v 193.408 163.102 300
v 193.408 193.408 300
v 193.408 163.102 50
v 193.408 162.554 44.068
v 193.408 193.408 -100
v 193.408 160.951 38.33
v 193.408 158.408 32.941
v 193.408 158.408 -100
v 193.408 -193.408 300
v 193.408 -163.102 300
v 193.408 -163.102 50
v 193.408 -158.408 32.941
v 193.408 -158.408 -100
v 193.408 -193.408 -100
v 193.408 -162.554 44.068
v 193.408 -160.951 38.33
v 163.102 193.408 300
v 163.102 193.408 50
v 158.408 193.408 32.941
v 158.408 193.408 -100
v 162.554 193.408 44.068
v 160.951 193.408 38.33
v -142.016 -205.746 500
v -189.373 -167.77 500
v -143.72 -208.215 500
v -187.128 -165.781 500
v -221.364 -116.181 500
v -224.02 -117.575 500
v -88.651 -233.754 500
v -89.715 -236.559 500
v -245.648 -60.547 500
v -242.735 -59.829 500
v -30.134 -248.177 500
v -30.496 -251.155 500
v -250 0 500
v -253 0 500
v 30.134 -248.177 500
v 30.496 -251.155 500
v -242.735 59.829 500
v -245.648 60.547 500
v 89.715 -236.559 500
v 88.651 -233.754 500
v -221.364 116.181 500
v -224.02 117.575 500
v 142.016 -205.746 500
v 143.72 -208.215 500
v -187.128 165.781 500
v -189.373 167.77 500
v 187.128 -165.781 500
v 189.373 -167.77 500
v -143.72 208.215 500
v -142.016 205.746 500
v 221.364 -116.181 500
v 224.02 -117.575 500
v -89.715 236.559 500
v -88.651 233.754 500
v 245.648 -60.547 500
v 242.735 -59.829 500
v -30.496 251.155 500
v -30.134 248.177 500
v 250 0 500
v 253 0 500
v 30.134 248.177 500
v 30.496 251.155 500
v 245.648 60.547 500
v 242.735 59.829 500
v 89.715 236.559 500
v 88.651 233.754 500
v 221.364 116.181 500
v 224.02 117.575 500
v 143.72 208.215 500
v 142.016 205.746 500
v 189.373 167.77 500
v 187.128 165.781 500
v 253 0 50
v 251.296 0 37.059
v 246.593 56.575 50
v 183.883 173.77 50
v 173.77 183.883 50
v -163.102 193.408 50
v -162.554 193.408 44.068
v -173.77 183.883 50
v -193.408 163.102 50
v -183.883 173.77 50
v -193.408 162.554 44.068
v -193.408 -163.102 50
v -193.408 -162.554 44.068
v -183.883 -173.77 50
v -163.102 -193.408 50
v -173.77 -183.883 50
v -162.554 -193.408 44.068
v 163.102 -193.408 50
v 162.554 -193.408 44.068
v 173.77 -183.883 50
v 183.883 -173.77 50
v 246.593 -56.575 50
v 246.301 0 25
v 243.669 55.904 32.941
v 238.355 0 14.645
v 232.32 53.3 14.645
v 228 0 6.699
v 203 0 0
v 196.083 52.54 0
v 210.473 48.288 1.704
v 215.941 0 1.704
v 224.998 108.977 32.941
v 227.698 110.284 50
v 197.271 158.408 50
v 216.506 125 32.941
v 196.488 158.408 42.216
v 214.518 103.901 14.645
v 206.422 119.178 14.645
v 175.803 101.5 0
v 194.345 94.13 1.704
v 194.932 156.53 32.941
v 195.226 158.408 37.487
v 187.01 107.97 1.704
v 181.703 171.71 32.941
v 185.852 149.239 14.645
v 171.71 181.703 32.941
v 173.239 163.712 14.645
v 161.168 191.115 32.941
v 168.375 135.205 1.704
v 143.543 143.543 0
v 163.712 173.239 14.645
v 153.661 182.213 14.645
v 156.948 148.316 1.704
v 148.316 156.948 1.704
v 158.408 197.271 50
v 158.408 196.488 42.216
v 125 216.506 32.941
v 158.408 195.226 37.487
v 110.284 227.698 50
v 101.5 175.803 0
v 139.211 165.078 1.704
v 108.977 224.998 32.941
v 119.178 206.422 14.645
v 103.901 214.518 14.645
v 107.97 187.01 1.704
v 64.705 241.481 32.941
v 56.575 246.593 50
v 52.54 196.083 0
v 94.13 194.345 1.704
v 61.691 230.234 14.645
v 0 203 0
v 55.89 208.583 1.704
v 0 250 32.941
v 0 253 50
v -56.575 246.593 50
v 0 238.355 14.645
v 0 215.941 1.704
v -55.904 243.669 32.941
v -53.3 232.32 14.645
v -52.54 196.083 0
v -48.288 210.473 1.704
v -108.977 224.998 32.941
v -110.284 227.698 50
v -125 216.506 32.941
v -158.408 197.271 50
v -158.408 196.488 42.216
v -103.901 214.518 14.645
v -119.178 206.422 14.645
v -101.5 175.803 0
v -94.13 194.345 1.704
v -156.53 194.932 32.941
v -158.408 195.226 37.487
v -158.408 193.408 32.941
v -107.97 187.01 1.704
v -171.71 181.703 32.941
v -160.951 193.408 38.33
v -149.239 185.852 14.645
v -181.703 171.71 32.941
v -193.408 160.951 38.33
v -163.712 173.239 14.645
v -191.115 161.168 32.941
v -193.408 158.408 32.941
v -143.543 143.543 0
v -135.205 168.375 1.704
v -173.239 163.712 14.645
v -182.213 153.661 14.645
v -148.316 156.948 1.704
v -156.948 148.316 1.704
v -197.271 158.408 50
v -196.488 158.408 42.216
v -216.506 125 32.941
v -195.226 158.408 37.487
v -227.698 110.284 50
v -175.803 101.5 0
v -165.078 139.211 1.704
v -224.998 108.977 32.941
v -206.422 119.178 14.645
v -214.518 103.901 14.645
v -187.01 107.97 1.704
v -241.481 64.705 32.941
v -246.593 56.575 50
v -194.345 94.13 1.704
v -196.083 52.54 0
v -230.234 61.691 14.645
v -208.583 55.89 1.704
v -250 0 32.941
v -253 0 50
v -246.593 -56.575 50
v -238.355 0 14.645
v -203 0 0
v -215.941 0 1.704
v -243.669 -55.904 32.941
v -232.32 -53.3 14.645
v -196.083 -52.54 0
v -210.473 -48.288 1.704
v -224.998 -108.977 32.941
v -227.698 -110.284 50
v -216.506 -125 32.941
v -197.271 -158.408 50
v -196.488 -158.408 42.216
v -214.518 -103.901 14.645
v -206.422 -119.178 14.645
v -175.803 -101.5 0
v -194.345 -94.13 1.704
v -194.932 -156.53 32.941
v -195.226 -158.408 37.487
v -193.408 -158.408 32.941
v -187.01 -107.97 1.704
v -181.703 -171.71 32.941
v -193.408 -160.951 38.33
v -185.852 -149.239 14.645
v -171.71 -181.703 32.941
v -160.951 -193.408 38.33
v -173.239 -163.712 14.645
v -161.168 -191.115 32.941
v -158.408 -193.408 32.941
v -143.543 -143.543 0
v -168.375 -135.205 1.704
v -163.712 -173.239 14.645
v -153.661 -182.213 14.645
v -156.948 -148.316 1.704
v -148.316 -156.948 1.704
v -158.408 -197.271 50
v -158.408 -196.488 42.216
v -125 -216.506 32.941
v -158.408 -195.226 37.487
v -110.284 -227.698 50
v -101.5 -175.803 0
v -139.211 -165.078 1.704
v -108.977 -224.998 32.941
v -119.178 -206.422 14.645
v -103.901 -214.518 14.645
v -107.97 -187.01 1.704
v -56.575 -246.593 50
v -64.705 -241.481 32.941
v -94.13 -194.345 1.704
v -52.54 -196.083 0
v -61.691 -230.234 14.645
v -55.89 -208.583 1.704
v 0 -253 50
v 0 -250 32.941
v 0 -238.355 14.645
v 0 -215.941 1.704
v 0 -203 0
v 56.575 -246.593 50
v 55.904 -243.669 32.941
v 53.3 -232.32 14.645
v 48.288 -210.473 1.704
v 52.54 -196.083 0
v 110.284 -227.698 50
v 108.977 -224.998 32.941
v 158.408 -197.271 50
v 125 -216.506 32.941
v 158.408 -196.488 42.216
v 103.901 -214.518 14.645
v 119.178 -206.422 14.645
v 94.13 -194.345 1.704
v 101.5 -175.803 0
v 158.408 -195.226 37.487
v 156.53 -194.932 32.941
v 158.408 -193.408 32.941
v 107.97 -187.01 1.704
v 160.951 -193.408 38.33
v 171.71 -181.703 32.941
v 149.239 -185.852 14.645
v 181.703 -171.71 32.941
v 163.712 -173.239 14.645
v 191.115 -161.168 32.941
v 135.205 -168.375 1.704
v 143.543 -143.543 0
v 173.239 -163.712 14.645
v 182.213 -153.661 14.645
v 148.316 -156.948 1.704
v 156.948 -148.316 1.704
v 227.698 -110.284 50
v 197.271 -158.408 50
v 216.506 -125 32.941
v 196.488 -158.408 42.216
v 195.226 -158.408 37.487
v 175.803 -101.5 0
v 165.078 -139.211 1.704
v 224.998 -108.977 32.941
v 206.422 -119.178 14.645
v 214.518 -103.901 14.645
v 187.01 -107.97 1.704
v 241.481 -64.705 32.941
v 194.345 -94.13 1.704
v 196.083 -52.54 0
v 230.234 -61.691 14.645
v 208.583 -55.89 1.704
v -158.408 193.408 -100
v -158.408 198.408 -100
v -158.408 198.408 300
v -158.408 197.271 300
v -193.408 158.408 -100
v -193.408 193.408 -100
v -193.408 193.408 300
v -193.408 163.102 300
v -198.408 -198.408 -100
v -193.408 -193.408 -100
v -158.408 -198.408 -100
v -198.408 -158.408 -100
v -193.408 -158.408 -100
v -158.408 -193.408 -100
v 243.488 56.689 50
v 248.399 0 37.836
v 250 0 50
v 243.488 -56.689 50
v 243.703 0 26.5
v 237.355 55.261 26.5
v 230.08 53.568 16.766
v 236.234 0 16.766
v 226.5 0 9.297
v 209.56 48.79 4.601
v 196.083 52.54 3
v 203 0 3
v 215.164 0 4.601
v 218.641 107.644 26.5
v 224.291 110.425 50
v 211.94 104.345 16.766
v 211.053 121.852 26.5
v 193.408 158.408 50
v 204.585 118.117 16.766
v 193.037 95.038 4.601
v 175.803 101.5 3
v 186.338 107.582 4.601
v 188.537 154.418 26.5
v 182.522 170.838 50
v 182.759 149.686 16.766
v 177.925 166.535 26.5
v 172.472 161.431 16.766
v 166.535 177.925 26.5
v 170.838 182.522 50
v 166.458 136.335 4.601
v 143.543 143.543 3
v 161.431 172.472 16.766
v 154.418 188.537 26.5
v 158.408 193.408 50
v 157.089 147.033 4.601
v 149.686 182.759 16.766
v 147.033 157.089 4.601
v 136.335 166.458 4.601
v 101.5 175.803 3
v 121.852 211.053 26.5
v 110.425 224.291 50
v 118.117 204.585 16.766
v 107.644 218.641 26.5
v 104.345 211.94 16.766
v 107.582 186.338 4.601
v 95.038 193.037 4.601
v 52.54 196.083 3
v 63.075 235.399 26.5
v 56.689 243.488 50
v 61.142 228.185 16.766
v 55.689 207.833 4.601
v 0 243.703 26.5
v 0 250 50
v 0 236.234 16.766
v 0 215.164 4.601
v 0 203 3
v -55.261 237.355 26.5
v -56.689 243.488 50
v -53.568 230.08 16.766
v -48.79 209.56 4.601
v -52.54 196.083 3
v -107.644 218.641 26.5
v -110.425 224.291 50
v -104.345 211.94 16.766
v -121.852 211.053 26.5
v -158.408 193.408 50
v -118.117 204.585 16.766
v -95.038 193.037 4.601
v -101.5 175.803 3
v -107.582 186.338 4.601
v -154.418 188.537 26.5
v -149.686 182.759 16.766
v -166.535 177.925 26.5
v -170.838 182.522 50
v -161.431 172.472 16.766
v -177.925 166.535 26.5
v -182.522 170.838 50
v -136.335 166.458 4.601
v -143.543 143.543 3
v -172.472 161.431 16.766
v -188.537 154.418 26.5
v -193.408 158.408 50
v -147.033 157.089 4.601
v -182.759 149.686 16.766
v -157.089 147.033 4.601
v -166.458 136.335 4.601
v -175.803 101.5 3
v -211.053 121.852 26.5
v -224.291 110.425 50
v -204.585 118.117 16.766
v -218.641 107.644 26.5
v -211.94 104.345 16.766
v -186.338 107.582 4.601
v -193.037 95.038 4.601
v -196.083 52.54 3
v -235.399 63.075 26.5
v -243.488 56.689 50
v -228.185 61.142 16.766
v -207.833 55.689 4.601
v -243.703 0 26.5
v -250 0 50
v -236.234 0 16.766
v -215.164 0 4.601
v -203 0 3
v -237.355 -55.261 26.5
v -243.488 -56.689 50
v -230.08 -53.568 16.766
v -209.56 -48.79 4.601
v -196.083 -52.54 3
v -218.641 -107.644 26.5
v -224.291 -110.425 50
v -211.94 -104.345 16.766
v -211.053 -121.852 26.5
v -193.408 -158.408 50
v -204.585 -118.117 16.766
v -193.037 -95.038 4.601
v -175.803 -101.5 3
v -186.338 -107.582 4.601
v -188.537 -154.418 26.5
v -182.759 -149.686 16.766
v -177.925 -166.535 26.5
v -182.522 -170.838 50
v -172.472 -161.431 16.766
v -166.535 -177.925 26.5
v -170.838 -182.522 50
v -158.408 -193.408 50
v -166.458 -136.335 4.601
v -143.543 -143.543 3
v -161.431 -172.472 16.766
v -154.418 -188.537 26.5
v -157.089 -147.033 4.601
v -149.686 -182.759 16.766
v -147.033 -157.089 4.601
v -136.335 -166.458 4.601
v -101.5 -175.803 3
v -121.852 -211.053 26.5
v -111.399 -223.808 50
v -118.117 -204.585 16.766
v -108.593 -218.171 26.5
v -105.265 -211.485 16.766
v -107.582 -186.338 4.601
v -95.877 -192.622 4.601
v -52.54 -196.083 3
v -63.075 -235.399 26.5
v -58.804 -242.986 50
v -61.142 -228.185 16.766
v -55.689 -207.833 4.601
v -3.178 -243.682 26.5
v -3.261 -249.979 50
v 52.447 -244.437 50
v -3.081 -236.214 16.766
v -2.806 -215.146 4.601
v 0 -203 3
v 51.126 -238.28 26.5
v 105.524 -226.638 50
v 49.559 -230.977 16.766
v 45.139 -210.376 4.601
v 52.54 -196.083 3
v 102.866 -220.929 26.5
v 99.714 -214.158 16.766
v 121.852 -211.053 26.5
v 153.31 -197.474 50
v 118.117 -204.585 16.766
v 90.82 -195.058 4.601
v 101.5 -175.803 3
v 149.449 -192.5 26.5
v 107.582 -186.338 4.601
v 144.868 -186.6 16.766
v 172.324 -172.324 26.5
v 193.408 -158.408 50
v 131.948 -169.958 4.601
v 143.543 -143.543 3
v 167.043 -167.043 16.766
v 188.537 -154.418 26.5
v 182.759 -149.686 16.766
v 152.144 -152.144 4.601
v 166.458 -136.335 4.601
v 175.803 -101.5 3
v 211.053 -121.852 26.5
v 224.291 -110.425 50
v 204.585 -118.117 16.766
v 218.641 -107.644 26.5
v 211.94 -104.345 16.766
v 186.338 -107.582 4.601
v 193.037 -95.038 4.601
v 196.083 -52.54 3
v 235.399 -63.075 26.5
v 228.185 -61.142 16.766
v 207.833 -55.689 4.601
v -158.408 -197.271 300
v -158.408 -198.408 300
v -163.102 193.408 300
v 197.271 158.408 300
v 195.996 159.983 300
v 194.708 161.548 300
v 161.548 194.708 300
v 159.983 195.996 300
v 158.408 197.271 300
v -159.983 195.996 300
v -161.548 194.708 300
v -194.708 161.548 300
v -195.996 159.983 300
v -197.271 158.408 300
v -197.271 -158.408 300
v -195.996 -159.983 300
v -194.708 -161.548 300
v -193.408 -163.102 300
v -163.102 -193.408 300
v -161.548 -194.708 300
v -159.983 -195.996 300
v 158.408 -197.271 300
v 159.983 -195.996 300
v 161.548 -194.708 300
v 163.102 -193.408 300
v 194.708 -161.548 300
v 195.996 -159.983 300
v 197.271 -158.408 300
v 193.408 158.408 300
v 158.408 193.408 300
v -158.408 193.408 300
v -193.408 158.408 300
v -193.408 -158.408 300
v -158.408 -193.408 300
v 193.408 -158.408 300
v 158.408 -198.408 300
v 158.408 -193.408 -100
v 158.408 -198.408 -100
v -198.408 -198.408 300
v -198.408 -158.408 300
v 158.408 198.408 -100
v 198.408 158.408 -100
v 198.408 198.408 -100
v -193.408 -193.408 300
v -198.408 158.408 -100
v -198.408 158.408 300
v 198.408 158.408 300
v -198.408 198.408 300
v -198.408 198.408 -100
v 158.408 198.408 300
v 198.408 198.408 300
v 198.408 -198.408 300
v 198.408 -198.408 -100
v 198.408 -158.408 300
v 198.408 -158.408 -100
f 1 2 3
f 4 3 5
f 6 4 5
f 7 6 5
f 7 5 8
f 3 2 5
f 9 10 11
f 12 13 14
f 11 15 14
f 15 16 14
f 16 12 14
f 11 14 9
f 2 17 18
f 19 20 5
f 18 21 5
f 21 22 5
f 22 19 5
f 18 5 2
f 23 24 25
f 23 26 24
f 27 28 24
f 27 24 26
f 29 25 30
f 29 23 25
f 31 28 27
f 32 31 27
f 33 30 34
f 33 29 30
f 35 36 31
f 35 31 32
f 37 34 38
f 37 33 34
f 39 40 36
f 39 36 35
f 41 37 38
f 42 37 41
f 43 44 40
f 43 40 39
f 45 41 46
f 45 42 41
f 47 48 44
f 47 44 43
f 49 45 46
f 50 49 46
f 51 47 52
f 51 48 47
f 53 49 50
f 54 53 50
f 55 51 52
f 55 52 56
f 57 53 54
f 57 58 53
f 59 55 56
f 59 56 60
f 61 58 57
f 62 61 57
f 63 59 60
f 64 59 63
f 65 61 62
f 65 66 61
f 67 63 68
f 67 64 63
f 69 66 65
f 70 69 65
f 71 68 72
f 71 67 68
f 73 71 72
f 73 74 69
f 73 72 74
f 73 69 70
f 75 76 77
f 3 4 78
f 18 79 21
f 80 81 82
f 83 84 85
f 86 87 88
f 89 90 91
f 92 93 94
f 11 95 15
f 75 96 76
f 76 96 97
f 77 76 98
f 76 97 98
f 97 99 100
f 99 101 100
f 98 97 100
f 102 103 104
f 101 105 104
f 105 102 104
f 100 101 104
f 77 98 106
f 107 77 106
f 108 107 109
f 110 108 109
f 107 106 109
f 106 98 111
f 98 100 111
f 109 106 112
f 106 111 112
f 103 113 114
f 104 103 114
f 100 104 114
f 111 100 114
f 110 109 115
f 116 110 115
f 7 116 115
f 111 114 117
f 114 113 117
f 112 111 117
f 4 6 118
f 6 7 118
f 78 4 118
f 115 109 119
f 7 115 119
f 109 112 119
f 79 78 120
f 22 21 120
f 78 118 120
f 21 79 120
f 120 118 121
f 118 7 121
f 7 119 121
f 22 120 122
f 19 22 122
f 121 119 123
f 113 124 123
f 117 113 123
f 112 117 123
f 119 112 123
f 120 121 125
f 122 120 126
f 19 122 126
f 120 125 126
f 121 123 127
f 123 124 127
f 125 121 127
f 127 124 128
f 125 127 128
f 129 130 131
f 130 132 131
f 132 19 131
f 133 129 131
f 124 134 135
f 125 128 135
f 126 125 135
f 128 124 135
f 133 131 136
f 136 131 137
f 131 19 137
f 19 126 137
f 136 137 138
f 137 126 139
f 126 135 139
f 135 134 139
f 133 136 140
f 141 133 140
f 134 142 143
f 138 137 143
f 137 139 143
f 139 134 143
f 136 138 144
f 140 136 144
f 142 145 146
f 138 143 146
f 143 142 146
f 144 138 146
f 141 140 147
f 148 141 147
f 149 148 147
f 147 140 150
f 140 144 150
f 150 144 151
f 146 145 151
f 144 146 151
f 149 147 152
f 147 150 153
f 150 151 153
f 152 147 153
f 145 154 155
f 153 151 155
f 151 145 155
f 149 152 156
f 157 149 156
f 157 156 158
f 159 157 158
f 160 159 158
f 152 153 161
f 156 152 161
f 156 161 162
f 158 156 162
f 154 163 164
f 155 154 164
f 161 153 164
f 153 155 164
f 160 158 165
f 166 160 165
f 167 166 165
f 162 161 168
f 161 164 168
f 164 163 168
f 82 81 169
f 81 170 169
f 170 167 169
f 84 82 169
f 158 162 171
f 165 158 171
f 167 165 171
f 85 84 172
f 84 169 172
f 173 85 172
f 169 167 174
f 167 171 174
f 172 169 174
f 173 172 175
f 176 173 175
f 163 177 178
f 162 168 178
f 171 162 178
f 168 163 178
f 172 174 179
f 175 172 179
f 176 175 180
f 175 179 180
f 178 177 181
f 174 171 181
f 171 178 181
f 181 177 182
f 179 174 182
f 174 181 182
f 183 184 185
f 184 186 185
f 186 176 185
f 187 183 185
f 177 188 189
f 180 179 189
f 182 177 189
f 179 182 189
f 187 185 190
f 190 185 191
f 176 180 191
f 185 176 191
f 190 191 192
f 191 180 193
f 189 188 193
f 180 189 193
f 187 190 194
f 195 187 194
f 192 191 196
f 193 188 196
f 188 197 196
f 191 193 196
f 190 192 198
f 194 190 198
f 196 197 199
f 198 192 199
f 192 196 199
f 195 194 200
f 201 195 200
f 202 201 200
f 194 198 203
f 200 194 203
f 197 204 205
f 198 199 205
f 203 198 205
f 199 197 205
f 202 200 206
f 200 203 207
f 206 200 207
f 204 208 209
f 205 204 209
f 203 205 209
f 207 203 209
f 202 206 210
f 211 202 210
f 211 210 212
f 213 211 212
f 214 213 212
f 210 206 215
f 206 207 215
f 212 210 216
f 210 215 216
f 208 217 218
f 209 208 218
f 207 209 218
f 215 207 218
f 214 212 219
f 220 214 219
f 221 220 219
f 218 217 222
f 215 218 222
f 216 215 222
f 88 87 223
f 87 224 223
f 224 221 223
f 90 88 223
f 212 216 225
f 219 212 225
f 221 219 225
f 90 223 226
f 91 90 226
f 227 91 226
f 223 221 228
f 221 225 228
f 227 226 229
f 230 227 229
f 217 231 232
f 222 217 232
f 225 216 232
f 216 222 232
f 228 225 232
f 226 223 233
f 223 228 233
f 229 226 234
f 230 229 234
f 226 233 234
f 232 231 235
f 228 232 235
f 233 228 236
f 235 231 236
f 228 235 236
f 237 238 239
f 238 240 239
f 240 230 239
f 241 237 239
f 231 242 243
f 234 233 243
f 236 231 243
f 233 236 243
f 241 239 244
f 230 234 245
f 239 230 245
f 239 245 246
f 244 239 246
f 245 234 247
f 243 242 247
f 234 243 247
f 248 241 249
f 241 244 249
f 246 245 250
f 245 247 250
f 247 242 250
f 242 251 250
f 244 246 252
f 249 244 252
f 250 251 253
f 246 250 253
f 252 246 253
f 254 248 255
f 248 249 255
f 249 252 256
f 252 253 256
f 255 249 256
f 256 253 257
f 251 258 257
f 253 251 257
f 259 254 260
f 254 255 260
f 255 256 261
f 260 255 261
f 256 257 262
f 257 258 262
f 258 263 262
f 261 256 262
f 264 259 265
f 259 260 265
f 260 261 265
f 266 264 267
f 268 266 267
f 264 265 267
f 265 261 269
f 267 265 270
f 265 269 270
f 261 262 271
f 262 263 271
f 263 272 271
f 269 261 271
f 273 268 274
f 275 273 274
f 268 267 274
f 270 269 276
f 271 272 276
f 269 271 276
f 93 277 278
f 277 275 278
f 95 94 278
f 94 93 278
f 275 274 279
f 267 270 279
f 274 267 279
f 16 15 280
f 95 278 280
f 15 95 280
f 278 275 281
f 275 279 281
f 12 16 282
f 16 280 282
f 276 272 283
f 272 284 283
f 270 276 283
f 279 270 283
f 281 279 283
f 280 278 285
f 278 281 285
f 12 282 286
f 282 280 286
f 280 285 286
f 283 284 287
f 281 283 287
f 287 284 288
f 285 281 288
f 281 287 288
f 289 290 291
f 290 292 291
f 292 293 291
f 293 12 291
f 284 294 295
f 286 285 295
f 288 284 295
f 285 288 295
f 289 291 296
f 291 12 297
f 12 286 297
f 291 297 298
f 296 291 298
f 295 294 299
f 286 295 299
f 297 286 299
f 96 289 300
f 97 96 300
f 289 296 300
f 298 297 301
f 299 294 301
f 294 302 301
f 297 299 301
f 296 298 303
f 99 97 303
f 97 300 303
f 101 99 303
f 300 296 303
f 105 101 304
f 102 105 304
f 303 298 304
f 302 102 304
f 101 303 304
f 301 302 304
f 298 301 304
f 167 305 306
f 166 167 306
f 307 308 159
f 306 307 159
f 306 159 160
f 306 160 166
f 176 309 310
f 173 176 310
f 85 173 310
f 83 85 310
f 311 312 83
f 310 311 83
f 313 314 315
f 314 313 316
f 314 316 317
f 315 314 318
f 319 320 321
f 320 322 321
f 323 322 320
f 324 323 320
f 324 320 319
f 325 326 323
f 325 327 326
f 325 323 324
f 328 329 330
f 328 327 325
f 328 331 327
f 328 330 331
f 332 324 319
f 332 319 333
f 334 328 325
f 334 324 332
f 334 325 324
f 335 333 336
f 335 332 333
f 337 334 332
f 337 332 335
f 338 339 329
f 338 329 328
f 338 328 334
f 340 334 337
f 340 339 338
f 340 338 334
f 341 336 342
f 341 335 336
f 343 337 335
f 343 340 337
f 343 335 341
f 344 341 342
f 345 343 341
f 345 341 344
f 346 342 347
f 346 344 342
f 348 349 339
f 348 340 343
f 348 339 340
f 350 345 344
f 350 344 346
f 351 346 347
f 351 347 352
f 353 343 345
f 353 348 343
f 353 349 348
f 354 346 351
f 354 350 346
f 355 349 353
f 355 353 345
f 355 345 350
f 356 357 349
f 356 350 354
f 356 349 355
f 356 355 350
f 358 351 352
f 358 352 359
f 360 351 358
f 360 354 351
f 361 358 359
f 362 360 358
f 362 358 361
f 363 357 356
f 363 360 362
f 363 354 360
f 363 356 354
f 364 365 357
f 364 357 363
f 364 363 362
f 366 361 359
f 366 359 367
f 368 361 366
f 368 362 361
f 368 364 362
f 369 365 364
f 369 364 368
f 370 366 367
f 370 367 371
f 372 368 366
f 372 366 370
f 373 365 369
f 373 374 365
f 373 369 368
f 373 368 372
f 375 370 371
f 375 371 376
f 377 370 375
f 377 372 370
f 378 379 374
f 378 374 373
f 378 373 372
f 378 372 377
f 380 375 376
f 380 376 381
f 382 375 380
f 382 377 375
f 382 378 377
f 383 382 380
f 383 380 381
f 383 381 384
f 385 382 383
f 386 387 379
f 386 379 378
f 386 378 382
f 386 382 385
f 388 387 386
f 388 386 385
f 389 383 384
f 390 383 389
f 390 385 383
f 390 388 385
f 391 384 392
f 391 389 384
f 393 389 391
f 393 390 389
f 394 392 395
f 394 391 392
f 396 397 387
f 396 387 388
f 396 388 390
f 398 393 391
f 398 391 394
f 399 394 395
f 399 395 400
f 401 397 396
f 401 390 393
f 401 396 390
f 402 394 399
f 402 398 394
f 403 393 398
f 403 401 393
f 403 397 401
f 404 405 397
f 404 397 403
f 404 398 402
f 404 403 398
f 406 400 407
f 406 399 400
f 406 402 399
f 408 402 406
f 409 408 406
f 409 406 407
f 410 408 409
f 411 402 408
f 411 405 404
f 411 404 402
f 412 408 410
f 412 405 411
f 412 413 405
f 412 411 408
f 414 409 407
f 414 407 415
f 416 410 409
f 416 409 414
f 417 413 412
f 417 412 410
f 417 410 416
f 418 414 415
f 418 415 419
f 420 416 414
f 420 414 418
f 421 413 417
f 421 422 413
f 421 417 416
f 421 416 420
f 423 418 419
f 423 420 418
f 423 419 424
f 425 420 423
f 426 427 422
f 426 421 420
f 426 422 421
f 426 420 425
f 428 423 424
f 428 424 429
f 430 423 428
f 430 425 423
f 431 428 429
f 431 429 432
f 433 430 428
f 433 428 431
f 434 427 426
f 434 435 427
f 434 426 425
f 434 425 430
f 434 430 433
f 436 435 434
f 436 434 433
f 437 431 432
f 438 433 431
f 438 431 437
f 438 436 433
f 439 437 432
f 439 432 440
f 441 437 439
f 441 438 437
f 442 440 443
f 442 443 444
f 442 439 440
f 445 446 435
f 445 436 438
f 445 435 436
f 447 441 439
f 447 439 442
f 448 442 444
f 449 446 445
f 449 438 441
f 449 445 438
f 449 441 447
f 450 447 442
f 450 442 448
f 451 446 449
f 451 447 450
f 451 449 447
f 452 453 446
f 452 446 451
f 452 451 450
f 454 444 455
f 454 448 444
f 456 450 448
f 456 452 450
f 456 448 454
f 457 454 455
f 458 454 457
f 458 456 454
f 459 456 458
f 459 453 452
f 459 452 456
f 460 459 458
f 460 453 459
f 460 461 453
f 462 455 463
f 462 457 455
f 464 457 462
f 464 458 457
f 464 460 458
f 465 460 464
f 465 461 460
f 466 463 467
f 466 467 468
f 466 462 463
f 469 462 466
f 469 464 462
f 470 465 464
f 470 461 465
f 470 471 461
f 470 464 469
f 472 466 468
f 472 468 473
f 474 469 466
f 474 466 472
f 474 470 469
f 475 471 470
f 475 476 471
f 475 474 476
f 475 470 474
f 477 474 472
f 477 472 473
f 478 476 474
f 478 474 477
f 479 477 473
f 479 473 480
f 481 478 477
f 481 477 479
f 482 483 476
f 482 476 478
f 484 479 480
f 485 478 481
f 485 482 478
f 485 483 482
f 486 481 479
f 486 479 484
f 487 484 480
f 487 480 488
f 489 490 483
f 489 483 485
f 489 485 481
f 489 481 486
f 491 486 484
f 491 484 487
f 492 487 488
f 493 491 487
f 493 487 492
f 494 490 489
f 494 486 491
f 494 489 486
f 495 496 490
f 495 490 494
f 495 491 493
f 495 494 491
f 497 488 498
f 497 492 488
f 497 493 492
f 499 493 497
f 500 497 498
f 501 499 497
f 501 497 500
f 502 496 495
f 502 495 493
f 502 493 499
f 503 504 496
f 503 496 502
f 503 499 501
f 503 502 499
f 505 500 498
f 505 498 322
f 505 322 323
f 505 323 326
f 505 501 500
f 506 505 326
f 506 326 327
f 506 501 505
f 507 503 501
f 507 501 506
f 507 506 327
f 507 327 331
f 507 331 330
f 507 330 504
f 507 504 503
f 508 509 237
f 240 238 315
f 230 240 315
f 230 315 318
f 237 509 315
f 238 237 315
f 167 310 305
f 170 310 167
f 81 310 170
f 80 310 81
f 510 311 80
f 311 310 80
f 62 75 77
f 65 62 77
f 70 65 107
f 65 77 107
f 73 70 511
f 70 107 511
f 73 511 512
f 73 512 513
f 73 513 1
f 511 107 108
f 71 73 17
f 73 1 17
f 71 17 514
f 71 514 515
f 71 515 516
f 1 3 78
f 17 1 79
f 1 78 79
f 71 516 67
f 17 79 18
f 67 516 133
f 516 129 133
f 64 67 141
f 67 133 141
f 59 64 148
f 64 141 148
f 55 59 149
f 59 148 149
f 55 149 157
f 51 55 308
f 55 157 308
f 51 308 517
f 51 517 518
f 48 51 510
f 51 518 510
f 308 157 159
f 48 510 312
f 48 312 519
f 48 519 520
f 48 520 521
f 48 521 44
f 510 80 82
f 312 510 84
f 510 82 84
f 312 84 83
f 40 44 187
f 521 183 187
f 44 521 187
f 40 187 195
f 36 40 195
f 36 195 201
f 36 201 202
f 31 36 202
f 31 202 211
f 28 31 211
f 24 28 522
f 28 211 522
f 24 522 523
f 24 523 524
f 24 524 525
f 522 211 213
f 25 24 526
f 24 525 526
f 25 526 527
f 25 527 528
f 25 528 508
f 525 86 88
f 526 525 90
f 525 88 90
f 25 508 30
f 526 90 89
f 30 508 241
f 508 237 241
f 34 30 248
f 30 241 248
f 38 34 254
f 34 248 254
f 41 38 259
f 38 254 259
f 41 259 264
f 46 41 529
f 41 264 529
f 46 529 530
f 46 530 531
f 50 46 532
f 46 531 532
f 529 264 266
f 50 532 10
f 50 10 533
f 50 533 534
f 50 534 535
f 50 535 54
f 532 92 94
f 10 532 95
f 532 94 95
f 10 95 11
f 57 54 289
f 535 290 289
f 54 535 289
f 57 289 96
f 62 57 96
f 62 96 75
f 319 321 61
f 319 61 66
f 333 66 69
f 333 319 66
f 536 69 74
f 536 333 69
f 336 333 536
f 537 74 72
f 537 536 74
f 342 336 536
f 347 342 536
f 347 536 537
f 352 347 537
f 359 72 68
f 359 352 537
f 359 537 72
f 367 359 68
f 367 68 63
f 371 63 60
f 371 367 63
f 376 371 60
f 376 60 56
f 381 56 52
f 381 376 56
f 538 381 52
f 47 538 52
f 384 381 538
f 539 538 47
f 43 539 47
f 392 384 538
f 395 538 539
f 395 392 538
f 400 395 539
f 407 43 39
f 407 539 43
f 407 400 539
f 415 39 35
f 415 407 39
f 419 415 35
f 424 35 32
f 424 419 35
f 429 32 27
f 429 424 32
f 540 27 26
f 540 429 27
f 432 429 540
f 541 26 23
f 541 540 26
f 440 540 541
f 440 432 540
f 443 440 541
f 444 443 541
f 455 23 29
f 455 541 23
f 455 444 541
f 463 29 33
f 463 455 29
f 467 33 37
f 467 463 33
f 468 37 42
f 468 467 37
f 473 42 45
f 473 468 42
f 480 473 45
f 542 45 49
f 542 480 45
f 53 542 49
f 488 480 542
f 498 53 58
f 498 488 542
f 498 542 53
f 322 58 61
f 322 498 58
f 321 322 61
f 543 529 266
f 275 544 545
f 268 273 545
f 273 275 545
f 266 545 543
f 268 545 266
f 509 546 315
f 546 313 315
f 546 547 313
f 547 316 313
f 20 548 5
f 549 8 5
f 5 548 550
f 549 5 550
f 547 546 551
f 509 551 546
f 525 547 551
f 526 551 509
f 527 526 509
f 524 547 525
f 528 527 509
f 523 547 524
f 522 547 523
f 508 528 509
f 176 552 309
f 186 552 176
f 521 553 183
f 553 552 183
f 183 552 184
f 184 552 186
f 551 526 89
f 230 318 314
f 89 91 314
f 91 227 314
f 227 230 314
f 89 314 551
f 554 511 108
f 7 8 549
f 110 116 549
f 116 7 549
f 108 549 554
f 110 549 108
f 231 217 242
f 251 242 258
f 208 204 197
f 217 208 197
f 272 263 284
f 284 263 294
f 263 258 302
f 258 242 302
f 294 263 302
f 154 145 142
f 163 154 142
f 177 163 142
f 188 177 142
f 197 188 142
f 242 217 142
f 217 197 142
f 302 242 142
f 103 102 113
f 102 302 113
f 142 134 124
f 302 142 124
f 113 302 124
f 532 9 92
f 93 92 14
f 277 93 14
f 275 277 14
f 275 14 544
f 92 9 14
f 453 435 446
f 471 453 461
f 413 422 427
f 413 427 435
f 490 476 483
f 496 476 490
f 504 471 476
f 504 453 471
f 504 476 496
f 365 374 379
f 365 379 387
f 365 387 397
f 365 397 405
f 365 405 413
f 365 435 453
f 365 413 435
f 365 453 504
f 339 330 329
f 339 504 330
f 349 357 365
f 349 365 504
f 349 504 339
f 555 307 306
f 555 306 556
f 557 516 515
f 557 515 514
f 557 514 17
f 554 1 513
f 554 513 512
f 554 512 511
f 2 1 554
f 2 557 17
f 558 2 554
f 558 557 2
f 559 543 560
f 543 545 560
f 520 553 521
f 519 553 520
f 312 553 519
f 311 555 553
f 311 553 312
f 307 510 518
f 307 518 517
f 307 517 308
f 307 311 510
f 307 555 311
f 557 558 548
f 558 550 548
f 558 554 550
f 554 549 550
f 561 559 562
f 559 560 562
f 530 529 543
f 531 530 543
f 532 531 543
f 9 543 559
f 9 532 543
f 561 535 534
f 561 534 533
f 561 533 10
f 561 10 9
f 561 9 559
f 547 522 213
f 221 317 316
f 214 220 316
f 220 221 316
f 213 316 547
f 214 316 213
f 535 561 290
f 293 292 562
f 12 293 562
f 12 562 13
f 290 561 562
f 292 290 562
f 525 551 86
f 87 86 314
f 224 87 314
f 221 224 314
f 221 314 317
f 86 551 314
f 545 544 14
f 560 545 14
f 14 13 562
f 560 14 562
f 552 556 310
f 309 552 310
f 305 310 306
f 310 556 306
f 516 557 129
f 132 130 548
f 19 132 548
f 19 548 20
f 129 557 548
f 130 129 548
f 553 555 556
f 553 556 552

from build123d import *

# Parameters (mm, degrees)
F0_R          = 253
F1_DEPTH      = 500
F2_R          = 50
F3_T          = -3
F5_DEPTH      = 300
F5_DEPTH_BACK = 100


with BuildPart() as f1:
    # F0 (on Top) → F1 (new body)
    with BuildSketch(Plane.XY):
        Circle(F0_R)
    extrude(amount=F1_DEPTH)

    # F2
    f2_edges = [f1.edges().sort_by_distance(p)[0] for p in [
        (-253, 0, 0),
    ]]
    fillet(f2_edges, radius=F2_R)

    # F3
    f3_openings = [f1.faces().sort_by_distance(p)[0] for p in [
        (0, 0, 500),
    ]]
    offset(amount=F3_T, openings=f3_openings)

    # F4 (on Top) → F5 (join, two sides)
    with BuildSketch(Plane.XY) as f5_sk:
        Polygon((-158.408357, 193.408357), (-158.408357, 198.408357), (-198.408357, 198.408357), (-198.408357, 158.408357), (-193.408357, 158.408357), (-193.408357, 193.408357), align=None)
        Polygon((158.408357, 198.408357), (158.408357, 193.408357), (193.408357, 193.408357), (193.408357, 158.408357), (198.408357, 158.408357), (198.408357, 198.408357), align=None)
        Polygon((198.408357, -198.408357), (198.408357, -158.408357), (193.408357, -158.408357), (193.408357, -193.408357), (158.408357, -193.408357), (158.408357, -198.408357), align=None)
        Polygon((-193.408357, -158.408357), (-198.408357, -158.408357), (-198.408357, -198.408357), (-158.408357, -198.408357), (-158.408357, -193.408357), (-193.408357, -193.408357), align=None)
    extrude(amount=F5_DEPTH)
    extrude(f5_sk.sketch, amount=-F5_DEPTH_BACK)


solid = f1.part
